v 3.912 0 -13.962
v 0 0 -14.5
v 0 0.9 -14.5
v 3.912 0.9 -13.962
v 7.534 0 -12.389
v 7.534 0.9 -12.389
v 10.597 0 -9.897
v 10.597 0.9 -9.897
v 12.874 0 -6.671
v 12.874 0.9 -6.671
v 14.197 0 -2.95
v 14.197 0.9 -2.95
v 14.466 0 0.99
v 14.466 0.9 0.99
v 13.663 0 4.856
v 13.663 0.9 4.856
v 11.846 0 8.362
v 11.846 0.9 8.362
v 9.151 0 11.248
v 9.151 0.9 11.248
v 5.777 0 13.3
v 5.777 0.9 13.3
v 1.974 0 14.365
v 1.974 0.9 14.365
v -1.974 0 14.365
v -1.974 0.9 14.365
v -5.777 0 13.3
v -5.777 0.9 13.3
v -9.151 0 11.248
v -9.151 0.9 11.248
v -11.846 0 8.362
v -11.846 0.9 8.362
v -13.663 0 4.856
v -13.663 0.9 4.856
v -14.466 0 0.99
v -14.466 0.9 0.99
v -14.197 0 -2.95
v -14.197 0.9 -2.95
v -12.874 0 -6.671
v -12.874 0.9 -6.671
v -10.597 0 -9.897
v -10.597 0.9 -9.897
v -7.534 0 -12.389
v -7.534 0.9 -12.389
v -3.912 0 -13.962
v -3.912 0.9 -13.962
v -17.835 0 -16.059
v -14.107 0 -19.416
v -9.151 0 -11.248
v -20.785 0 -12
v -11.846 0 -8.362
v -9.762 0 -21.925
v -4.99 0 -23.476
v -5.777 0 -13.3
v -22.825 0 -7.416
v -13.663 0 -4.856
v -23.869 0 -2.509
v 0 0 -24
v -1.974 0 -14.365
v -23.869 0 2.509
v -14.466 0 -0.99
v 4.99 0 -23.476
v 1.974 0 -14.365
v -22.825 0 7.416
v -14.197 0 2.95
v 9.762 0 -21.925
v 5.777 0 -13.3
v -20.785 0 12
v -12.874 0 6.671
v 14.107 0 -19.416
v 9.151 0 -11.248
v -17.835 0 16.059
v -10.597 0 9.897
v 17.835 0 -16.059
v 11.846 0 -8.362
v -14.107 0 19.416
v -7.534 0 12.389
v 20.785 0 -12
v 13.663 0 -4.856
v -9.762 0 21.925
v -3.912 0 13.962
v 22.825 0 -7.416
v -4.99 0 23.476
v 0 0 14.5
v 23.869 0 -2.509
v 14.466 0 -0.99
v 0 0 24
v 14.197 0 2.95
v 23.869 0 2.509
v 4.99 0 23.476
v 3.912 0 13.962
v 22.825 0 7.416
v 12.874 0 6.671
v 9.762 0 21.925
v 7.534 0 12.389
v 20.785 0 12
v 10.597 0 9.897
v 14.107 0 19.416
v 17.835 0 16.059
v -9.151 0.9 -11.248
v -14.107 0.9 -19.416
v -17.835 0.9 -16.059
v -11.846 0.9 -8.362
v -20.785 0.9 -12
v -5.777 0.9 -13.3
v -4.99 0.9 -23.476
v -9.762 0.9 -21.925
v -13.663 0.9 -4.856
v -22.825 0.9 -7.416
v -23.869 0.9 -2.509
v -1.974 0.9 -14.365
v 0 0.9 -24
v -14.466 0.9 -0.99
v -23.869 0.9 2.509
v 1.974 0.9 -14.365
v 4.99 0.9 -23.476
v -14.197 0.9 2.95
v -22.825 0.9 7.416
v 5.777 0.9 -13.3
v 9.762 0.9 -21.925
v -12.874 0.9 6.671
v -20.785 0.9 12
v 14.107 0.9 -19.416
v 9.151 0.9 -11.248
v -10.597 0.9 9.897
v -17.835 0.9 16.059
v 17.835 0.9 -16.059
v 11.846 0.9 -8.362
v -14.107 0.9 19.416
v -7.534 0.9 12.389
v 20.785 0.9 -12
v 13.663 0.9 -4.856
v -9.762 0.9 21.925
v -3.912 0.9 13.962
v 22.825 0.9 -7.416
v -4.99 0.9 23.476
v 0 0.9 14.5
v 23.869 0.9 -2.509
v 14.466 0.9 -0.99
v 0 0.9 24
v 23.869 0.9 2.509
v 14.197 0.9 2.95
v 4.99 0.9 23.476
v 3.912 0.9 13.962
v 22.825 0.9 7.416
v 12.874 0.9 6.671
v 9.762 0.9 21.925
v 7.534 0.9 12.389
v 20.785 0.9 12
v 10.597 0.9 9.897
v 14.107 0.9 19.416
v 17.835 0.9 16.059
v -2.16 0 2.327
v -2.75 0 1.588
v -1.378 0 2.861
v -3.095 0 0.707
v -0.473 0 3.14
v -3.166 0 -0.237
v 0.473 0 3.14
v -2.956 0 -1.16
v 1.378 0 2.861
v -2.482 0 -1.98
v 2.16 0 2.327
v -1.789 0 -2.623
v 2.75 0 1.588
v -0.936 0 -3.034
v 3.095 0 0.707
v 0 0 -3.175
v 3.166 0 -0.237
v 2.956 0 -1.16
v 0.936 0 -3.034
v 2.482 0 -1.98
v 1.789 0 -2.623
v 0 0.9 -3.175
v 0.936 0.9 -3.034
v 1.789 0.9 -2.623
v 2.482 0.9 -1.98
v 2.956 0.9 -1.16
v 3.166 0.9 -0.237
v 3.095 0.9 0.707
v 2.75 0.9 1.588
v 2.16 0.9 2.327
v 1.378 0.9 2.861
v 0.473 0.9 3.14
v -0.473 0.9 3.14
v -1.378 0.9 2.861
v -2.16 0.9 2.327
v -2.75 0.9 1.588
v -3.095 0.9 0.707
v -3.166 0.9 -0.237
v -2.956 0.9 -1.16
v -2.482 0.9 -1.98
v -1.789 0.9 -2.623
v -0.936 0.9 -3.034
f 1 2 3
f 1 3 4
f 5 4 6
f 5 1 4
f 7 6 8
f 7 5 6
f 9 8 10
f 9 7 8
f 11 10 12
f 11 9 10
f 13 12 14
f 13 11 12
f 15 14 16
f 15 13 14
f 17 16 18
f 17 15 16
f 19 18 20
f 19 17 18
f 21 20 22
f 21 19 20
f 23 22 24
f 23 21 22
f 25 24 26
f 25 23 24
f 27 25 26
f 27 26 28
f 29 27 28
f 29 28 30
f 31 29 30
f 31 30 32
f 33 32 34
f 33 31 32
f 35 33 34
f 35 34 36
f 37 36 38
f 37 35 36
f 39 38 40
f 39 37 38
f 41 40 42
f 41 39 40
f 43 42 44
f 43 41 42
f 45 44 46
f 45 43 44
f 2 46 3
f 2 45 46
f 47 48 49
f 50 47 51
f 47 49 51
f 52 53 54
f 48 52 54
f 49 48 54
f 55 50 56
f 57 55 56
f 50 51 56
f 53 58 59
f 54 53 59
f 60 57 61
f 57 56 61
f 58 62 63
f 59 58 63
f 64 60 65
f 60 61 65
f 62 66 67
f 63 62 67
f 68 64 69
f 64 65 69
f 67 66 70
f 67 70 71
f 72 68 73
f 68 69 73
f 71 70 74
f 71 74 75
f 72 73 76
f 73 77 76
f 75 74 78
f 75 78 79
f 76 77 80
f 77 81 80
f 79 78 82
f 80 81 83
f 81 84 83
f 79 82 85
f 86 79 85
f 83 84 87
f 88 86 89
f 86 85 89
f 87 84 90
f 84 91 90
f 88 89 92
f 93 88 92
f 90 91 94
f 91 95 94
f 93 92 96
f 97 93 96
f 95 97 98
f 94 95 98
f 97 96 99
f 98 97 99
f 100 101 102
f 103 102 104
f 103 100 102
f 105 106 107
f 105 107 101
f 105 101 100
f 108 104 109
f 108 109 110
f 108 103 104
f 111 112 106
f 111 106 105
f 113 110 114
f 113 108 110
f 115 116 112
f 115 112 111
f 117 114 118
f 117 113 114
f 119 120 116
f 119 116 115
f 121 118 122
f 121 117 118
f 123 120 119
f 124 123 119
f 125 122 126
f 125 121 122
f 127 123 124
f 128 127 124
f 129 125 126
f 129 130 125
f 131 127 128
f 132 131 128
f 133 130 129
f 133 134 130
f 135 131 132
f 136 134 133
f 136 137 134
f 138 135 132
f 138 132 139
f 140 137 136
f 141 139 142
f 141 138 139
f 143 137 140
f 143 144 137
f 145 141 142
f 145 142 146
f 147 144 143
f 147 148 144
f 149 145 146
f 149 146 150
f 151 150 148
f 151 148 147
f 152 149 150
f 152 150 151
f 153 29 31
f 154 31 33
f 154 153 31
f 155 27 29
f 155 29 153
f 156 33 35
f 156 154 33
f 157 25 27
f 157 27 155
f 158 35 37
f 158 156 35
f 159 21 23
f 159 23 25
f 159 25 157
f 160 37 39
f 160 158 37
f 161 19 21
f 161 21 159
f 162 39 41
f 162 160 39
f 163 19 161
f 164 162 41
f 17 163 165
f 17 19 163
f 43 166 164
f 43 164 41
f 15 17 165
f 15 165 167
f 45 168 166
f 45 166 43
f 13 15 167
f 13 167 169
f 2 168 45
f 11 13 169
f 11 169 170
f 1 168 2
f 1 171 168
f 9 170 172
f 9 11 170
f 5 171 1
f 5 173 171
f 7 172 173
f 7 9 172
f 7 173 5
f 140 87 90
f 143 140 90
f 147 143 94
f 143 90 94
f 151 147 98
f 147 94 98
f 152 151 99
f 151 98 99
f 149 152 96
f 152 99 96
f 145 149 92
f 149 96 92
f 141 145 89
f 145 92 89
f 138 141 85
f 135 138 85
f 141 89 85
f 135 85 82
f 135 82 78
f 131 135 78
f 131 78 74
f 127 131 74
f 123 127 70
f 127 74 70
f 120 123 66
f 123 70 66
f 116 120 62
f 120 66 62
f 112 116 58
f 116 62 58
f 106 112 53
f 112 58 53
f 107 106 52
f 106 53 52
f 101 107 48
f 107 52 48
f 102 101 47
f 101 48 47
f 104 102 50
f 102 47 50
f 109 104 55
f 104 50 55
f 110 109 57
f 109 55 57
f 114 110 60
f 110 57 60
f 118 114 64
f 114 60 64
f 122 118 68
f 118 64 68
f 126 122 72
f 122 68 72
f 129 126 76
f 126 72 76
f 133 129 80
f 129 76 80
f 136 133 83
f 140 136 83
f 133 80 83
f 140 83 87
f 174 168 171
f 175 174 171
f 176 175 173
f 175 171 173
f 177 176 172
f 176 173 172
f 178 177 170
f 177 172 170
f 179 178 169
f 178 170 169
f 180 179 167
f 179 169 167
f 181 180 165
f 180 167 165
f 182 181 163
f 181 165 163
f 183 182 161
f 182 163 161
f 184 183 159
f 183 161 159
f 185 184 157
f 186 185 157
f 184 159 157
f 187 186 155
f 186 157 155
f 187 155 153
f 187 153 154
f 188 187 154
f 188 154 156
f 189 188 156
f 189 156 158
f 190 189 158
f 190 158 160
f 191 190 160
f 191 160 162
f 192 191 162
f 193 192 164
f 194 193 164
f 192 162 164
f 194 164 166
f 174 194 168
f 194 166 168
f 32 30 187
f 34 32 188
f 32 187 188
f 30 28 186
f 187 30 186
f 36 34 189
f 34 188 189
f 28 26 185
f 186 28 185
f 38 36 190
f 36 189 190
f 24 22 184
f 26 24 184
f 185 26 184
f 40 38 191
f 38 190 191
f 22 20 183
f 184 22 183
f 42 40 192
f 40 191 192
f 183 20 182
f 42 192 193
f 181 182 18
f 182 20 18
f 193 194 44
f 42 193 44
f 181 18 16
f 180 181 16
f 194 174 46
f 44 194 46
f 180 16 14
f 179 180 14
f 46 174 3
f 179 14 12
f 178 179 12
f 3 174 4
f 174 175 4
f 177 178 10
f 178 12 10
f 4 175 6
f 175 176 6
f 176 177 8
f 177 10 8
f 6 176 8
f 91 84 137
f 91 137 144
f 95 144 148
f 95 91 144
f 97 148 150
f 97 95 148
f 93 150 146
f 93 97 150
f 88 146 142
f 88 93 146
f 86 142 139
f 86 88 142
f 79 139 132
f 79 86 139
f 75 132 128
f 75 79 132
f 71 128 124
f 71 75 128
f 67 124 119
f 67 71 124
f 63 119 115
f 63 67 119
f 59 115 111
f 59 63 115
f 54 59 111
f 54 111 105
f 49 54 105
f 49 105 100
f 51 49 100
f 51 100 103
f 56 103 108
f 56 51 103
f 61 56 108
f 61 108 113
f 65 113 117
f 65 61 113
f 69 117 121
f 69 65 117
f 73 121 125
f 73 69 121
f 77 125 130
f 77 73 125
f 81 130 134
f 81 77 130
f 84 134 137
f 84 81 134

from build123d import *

# Parameters (mm, degrees)
SKETCH1_R           = 24
SKETCH1_R_2         = 14.5
BOSS_EXTRUDE1_DEPTH = 0.9
SKETCH2_R           = 14.5
SKETCH2_R_2         = 3.175
BOSS_EXTRUDE2_DEPTH = 0.9


with BuildPart() as part:
    # Sketch1 → Boss-Extrude1 (new body)
    with BuildSketch(Plane(origin=(0, 0, 0), x_dir=(1, 0, 0), z_dir=(0, 1, 0))):
        with Locations(Location((0, 0, 0), (0, 0, 270))):
            Circle(SKETCH1_R)
        with Locations(Location((0, 0, 0), (0, 0, 270))):
            Circle(SKETCH1_R_2, mode=Mode.SUBTRACT)
    extrude(amount=BOSS_EXTRUDE1_DEPTH)


with BuildPart() as body_2:
    # Sketch2 → Boss-Extrude2 (new body)
    with BuildSketch(Plane.XZ):
        with Locations(Location((0, 0, 0), (0, 0, 270))):
            Circle(SKETCH2_R)
        with Locations(Location((0, 0, 0), (0, 0, 270))):
            Circle(SKETCH2_R_2, mode=Mode.SUBTRACT)
    extrude(amount=-BOSS_EXTRUDE2_DEPTH)


solid = Compound([part.part, body_2.part])
